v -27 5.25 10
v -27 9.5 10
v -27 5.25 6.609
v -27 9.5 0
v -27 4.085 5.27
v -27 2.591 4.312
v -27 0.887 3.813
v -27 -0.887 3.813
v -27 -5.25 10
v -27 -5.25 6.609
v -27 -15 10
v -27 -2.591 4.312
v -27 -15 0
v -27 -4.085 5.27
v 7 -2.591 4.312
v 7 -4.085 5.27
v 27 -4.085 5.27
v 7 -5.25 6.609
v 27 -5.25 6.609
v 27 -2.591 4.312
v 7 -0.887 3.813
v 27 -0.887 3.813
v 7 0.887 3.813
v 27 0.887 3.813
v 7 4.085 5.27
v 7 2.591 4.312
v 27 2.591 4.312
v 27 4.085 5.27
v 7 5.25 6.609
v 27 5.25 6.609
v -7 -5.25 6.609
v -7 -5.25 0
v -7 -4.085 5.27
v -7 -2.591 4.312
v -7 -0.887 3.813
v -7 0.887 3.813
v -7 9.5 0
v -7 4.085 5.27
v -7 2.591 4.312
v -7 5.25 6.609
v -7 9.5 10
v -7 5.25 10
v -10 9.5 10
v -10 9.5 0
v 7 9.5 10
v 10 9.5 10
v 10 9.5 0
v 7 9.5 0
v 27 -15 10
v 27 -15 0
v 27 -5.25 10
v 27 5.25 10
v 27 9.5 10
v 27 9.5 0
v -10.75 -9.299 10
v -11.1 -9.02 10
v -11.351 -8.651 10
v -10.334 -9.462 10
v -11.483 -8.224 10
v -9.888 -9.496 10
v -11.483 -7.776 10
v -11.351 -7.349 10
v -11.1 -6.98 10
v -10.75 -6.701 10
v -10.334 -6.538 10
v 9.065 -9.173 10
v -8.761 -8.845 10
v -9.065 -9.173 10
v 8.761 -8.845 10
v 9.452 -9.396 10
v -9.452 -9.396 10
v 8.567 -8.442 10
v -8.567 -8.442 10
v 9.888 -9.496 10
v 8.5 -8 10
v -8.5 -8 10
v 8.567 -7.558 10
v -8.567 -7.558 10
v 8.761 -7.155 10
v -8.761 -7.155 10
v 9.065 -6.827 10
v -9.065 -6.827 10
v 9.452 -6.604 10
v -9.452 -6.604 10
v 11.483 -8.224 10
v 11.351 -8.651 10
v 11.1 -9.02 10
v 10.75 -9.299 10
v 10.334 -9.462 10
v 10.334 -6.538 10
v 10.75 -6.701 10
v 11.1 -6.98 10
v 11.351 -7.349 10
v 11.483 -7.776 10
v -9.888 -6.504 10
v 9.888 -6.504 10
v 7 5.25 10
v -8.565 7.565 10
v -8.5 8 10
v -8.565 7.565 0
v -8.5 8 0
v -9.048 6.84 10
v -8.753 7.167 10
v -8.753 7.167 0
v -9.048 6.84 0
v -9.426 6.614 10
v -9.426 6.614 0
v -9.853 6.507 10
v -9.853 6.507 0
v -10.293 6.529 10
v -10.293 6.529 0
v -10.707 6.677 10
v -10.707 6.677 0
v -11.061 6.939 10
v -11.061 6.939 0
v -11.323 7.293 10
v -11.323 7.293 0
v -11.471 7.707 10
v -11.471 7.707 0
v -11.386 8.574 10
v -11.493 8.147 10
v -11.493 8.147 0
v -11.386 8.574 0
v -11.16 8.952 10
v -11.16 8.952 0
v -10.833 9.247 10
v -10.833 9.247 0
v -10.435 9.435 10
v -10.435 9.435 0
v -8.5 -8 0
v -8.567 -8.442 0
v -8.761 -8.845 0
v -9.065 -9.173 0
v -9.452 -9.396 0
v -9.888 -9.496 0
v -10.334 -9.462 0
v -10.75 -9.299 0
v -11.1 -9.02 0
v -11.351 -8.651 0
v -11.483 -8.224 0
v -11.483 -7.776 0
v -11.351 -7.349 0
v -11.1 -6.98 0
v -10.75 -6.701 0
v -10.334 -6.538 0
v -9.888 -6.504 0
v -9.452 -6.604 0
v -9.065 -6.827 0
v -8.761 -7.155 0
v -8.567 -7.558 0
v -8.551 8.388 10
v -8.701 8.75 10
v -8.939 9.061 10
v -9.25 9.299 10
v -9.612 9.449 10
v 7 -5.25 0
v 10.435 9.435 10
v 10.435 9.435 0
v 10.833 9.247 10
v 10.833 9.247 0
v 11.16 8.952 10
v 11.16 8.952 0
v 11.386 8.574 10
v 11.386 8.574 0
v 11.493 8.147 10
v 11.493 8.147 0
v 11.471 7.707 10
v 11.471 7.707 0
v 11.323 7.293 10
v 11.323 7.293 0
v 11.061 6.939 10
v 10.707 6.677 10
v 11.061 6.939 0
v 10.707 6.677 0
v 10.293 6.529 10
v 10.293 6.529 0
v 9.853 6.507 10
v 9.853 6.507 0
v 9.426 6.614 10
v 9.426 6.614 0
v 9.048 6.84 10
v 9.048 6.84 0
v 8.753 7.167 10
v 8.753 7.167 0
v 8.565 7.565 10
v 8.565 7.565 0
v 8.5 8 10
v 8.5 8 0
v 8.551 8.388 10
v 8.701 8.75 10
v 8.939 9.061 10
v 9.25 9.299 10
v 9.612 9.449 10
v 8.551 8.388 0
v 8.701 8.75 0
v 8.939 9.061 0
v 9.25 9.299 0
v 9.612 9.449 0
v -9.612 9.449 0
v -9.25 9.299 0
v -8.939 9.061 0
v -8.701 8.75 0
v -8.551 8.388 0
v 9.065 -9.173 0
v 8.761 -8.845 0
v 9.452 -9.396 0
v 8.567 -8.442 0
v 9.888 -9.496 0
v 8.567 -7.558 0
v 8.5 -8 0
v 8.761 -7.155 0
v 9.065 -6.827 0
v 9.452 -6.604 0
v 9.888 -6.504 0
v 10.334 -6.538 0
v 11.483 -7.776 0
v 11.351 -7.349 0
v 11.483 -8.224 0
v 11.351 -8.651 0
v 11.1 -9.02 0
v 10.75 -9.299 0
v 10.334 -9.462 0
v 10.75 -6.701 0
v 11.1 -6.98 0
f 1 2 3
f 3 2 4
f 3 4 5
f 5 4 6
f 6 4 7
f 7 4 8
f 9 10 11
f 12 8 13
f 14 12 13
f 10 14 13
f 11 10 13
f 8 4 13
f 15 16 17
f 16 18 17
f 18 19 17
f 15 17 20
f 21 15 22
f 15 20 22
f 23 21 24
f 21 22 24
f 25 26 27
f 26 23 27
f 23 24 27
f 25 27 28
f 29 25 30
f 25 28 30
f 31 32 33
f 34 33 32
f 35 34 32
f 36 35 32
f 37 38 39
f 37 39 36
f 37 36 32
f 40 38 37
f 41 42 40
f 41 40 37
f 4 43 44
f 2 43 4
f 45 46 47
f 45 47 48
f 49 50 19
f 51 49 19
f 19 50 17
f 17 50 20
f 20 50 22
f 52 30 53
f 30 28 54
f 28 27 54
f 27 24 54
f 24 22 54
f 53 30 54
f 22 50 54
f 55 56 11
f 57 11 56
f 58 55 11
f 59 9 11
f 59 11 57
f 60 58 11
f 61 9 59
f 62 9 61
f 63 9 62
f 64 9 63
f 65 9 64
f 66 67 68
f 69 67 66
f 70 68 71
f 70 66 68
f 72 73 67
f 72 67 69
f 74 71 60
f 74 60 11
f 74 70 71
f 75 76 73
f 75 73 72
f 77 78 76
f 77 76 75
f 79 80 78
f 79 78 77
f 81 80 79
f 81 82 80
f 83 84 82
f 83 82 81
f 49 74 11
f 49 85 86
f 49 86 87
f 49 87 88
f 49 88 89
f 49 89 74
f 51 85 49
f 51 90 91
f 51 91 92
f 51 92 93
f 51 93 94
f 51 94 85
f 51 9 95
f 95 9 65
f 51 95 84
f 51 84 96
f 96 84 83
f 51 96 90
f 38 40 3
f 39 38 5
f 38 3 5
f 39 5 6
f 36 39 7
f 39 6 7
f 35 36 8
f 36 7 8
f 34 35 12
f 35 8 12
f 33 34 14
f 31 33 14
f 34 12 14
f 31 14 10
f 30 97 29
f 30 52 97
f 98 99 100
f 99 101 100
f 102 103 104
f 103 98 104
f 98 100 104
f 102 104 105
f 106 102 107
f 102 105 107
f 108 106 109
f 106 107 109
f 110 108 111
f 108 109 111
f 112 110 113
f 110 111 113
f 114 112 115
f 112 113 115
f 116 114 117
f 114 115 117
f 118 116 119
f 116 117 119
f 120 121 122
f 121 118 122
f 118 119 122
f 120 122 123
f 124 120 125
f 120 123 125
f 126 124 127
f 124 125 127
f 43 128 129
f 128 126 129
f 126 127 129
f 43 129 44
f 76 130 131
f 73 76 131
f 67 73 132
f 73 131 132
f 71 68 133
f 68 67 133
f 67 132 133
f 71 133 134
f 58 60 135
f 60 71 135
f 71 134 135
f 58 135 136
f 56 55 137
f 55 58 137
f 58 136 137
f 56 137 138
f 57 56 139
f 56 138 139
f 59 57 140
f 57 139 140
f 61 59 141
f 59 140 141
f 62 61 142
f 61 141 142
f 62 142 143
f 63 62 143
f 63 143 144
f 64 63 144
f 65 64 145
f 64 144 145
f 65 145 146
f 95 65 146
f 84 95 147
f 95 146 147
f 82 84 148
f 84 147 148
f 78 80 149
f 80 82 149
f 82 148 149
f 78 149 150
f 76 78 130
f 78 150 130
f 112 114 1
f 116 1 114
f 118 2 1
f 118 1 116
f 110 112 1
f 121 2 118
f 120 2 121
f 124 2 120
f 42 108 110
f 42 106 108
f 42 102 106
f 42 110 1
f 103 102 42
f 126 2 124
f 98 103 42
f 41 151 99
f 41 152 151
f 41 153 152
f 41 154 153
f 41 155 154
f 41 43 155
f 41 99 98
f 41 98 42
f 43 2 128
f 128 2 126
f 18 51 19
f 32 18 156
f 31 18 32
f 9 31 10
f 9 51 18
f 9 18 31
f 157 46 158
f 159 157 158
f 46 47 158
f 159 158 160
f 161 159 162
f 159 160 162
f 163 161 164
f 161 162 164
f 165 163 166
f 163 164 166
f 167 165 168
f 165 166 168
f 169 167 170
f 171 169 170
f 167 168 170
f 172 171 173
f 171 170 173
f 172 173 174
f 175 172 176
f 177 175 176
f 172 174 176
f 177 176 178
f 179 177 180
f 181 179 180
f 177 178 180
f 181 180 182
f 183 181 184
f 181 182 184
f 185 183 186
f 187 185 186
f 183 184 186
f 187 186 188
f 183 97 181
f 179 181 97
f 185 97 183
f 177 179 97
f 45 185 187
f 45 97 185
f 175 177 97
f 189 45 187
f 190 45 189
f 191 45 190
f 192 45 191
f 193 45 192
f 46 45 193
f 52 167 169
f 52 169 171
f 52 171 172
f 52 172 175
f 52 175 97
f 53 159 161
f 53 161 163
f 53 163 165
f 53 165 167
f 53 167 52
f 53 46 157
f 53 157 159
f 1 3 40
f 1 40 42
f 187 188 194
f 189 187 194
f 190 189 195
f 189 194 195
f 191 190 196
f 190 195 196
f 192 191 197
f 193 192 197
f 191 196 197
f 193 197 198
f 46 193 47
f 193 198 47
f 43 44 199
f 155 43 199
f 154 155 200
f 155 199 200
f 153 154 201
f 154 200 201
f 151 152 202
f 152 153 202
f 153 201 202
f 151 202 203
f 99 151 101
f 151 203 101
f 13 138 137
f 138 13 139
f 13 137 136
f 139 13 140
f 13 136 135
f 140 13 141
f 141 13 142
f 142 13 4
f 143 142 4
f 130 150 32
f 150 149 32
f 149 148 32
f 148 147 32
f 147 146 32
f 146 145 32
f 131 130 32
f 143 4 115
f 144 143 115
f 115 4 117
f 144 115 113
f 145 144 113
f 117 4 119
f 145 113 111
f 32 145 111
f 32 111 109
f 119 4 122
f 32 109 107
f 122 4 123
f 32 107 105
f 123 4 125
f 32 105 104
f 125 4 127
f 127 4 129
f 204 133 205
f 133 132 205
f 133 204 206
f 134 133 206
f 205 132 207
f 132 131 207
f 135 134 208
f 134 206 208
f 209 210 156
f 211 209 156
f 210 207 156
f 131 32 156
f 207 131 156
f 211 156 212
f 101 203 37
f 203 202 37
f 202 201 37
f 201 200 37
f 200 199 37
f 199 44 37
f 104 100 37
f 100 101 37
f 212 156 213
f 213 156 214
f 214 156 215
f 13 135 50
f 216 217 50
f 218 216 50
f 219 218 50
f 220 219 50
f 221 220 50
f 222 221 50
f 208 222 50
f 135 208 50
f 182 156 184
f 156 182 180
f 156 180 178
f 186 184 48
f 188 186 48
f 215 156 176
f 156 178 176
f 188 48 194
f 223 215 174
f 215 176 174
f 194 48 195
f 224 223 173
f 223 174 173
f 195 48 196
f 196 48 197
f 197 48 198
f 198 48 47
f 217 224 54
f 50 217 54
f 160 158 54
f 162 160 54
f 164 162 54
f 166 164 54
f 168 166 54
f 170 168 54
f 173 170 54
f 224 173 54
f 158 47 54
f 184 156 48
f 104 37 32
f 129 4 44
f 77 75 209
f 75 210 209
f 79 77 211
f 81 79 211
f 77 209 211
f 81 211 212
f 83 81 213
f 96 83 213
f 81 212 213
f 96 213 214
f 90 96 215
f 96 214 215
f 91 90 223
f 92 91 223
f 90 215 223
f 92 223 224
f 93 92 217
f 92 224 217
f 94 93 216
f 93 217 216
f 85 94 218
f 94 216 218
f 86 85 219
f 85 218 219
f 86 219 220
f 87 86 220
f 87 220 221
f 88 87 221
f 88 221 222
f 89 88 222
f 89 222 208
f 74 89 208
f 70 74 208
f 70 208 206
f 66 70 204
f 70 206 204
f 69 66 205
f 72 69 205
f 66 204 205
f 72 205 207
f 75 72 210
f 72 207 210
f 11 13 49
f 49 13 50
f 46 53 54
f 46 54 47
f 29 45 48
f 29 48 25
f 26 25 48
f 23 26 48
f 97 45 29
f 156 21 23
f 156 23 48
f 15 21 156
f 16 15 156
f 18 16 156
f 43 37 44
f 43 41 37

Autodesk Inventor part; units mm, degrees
ref_plane "YZ Plane" through (0, 0, 0) normal (1, 0, 0) x (0, 1, 0)
ref_plane "XZ Plane" through (0, 0, 0) normal (0, 1, 0) x (-1, 0, 0)
ref_plane "XY Plane" through (0, 0, 0) normal (0, 0, 1) x (1, 0, 0)
sketch "Náčrt1" plane through (0, 0, 0) normal (0, 0, 1) x (1, 0, 0)
  line L0 (0, 15) -> (-27, 15)
  line L1 (-27, 15) -> (-27, -15)
  line L2 (-27, -15) -> (0, -15)
  line L3 (0, -15) -> (0, 15)
  circle A0 centre (-10, 8) radius 1.5
  line L4 (-14.1616, 0) -> (12.8881, 0)
  circle A1 centre (-10, -8) radius 1.5
  point P0 (0, 0)
  point P1 (0, 0)
  dimension "d13" = 30
  dimension "d14" = 27
  dimension "d15" = 3
  dimension "d18" = 16
  dimension "d23" = 10
extrude "Vysunutí2" add sketch "Náčrt1" along normal blind 10
sketch "Náčrt2" plane through (-27, -15, 0) normal (-1, 0, 0) x (0, 0, 1)
  line L0 (10, 0) -> (10, 30) projected
  line L1 (10, 20) -> (6.6834, 20)
  line L2 (10, 10) -> (6.6834, 10)
  arc A0 (6.6834, 20) -> (6.6834, 10) centre (10, 15) ccw
  line L3 (0, 30) -> (0, 0) projected
  line L4 (10, 9.75) -> (6.6088, 9.75)
  arc A1 (6.6088, 20.25) -> (6.6088, 9.75) centre (10, 15) ccw
  line L5 (6.6088, 20.25) -> (10, 20.25)
  point P0 (0, 15)
  point P1 (0, 15)
  dimension "d26" = 10
  dimension "d27" = 6
  dimension "d28" = 0.25
extrude "Vysunutí3" cut sketch "Náčrt2" against normal through all
sketch "Náčrt3" plane through (0, 0, 10) normal (0, 0, 1) x (1, 0, 0)
  line L0 (0, 15) -> (-27, 15) projected
  circle A0 centre (-10, 8) radius 1.5 projected
  line L1 (0, -5.25) -> (-27, -5.25) projected
  line L2 (0, 5.25) -> (0, 15) projected
  line L3 (-7, -5.25) -> (-7, 9.5)
  line L4 (-7, 9.5) -> (-27, 9.5)
  line L5 (-27, 15) -> (-27, 5.25) projected
  line L6 (0, 5.25) -> (0, -5.25) projected
  point P0 (0, 0)
  dimension "d34" = 3
extrude "Vysunutí4" cut sketch "Náčrt3" against normal through all contours L2 L6 L1 L3 L4 L5 L0
mirror "Zrcadlit1" about plane through (0, -15, 0) normal (1, 0, 0)
properties part number "Držák motoru (spodní díl)"
